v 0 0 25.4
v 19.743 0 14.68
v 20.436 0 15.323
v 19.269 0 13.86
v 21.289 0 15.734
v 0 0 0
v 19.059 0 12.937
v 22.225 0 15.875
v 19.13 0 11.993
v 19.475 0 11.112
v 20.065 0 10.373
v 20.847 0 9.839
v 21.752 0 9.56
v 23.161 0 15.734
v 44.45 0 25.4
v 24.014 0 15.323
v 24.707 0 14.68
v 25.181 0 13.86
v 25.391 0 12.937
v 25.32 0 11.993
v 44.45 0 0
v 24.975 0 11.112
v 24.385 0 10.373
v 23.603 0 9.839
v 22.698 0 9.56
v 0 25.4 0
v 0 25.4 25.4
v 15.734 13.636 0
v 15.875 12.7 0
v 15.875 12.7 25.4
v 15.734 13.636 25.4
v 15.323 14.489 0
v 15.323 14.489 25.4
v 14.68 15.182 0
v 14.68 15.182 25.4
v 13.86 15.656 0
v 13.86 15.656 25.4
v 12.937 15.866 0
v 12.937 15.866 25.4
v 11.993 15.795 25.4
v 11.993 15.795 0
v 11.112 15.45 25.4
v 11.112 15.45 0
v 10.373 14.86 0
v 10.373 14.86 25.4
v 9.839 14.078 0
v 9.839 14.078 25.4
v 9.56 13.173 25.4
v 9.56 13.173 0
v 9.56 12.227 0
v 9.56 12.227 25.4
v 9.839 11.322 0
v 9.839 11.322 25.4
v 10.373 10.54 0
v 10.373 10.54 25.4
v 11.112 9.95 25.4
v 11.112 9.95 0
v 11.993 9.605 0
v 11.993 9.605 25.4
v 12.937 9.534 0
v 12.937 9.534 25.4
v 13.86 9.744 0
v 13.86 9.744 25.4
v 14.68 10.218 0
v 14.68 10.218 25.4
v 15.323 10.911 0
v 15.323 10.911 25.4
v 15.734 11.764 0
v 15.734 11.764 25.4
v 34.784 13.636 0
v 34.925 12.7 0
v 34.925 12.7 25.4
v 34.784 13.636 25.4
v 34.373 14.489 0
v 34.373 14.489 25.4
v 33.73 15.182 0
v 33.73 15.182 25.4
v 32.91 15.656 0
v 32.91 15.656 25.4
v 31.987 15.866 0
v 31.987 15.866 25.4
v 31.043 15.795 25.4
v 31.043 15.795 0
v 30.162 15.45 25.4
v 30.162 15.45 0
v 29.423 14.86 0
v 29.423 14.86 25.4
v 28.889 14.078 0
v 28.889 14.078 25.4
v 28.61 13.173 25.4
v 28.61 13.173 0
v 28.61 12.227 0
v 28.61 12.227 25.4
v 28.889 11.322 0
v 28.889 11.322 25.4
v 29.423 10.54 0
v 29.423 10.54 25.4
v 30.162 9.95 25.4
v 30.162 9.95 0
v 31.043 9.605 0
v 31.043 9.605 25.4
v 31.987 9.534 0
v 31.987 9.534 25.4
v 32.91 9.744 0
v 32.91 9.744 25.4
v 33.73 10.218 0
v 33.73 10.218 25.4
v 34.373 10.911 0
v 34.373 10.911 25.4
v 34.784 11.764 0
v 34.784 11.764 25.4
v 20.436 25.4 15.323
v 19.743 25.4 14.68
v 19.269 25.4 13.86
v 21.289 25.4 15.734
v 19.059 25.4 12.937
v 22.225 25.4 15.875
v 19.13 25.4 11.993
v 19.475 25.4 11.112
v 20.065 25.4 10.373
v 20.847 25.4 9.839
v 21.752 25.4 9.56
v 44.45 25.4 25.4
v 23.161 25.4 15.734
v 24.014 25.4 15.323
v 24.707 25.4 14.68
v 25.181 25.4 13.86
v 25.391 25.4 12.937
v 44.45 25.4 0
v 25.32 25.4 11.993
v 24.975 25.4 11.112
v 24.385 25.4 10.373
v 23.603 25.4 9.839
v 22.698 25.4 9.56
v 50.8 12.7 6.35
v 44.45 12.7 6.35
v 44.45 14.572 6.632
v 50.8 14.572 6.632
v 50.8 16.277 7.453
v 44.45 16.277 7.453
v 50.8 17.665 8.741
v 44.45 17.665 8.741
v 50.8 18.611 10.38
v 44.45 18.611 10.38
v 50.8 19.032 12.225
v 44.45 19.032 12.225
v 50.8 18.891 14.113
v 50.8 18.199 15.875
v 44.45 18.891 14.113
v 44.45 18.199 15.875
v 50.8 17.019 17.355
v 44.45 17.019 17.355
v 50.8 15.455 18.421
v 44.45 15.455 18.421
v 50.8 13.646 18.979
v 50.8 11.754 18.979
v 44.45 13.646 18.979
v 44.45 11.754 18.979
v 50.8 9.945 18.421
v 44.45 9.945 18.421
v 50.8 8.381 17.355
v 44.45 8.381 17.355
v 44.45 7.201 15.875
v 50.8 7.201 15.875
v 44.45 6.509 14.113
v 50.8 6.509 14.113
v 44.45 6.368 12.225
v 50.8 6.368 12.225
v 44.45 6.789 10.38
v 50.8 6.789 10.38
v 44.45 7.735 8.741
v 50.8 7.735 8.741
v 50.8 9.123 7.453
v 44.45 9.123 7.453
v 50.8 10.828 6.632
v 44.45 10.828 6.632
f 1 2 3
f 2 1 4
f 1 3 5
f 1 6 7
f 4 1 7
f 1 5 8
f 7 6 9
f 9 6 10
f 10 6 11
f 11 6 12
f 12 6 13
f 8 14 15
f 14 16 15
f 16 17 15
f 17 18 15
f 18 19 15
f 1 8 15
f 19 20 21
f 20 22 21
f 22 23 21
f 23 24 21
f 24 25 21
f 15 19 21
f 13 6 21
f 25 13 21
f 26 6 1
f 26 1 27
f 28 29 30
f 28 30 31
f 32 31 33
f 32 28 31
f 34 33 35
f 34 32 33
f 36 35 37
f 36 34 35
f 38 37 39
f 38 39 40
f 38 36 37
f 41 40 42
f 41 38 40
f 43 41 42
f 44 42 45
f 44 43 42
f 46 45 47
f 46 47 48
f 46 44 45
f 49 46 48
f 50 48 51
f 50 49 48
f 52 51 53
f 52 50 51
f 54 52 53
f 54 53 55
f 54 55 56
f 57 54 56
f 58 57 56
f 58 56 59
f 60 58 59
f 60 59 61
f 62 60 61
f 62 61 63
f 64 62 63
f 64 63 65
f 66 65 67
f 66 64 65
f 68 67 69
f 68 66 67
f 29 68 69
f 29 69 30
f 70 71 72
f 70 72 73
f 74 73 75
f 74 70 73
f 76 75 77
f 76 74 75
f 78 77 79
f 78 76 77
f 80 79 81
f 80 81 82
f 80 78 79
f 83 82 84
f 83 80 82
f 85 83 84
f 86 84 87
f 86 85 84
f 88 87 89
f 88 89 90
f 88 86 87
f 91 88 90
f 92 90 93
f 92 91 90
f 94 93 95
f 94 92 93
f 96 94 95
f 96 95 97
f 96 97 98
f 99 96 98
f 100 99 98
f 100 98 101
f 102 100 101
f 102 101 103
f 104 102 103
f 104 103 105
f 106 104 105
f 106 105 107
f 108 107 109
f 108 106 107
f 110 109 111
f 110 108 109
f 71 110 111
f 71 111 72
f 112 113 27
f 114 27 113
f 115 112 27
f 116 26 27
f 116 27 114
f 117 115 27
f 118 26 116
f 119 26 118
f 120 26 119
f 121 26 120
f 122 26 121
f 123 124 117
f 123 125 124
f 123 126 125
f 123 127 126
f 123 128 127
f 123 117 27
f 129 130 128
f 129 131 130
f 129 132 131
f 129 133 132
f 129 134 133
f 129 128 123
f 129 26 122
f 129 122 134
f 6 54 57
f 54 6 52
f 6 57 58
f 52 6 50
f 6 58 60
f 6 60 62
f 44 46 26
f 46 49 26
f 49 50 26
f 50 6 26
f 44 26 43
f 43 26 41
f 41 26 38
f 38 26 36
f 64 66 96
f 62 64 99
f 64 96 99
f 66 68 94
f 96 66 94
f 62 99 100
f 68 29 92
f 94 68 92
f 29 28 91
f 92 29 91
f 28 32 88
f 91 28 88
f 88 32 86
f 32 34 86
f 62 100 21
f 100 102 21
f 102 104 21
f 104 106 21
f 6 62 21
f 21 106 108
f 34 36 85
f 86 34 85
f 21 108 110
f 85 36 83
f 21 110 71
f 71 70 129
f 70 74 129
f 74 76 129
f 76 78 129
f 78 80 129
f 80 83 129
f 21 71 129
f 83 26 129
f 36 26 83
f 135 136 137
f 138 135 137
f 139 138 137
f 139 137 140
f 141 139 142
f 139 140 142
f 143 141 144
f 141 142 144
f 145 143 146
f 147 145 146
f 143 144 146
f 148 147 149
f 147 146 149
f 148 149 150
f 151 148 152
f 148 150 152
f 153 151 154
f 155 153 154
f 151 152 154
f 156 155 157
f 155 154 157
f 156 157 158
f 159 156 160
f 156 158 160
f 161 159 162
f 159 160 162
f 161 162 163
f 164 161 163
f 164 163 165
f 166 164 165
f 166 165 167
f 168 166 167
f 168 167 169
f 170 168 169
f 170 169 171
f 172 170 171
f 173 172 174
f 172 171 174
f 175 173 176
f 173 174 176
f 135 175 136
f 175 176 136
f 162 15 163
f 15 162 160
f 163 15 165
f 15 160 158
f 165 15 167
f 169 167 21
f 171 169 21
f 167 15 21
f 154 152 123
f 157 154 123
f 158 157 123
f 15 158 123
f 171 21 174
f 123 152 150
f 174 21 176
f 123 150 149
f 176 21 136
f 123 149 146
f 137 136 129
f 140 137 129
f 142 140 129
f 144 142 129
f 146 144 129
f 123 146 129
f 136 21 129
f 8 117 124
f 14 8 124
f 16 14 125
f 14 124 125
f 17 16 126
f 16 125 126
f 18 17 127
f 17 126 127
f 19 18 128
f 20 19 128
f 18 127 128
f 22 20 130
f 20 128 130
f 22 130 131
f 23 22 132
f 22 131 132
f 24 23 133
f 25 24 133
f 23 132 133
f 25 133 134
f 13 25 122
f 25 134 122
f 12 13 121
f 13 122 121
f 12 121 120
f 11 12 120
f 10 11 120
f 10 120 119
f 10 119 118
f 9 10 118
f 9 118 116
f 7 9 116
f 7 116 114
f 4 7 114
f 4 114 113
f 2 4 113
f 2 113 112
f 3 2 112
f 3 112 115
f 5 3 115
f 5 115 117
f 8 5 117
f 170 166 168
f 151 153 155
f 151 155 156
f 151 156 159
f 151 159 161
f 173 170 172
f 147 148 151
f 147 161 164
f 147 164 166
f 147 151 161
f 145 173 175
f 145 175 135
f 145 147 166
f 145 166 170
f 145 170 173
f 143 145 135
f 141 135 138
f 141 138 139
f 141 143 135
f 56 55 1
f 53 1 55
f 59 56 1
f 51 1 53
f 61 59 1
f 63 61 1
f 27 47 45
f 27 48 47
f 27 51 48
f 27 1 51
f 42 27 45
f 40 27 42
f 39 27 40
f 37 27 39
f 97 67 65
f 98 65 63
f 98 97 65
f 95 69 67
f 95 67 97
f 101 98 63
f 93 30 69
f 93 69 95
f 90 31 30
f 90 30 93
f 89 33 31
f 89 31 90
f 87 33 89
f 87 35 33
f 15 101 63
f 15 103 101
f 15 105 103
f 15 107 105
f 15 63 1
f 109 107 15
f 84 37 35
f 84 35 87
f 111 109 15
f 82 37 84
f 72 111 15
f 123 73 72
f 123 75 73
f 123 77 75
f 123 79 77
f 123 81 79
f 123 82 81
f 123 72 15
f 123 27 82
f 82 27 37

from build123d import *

# Parameters (mm, degrees)
SKETCH1_W           = 44.45
SKETCH1_H           = 25.4
SKETCH1_R           = 3.175
BOSS_EXTRUDE1_DEPTH = 25.4
SKETCH2_R           = 6.35
BOSS_EXTRUDE2_DEPTH = 6.35
SKETCH3_R           = 3.175
CUT_EXTRUDE1_DEPTH  = 63.217039467


with BuildPart() as part:
    # Sketch1 → Boss-Extrude1 (new body)
    with BuildSketch(Plane.XY):
        with Locations((22.225, 12.7)):
            Rectangle(SKETCH1_W, SKETCH1_H)
        with Locations((12.7, 12.7)):
            Circle(SKETCH1_R, mode=Mode.SUBTRACT)
        with Locations((31.75, 12.7)):
            Circle(SKETCH1_R, mode=Mode.SUBTRACT)
    extrude(amount=BOSS_EXTRUDE1_DEPTH)

    # Sketch2 → Boss-Extrude2 (add)
    with BuildSketch(Plane(origin=(44.45, 0, 0), x_dir=(0, 0, -1), z_dir=(1, 0, 0))):
        with Locations((-12.7, 12.7)):
            Circle(SKETCH2_R)
    extrude(amount=BOSS_EXTRUDE2_DEPTH)

    # Sketch3 → Cut-Extrude1 (cut, through all)
    with BuildSketch(Plane(origin=(0, 25.4, 0), x_dir=(1, 0, 0), z_dir=(0, 1, 0))):
        with Locations(Location((22.225, -12.7, 0), (0, 0, 270))):
            Circle(SKETCH3_R)
    extrude(amount=-CUT_EXTRUDE1_DEPTH, mode=Mode.SUBTRACT)


solid = part.part
